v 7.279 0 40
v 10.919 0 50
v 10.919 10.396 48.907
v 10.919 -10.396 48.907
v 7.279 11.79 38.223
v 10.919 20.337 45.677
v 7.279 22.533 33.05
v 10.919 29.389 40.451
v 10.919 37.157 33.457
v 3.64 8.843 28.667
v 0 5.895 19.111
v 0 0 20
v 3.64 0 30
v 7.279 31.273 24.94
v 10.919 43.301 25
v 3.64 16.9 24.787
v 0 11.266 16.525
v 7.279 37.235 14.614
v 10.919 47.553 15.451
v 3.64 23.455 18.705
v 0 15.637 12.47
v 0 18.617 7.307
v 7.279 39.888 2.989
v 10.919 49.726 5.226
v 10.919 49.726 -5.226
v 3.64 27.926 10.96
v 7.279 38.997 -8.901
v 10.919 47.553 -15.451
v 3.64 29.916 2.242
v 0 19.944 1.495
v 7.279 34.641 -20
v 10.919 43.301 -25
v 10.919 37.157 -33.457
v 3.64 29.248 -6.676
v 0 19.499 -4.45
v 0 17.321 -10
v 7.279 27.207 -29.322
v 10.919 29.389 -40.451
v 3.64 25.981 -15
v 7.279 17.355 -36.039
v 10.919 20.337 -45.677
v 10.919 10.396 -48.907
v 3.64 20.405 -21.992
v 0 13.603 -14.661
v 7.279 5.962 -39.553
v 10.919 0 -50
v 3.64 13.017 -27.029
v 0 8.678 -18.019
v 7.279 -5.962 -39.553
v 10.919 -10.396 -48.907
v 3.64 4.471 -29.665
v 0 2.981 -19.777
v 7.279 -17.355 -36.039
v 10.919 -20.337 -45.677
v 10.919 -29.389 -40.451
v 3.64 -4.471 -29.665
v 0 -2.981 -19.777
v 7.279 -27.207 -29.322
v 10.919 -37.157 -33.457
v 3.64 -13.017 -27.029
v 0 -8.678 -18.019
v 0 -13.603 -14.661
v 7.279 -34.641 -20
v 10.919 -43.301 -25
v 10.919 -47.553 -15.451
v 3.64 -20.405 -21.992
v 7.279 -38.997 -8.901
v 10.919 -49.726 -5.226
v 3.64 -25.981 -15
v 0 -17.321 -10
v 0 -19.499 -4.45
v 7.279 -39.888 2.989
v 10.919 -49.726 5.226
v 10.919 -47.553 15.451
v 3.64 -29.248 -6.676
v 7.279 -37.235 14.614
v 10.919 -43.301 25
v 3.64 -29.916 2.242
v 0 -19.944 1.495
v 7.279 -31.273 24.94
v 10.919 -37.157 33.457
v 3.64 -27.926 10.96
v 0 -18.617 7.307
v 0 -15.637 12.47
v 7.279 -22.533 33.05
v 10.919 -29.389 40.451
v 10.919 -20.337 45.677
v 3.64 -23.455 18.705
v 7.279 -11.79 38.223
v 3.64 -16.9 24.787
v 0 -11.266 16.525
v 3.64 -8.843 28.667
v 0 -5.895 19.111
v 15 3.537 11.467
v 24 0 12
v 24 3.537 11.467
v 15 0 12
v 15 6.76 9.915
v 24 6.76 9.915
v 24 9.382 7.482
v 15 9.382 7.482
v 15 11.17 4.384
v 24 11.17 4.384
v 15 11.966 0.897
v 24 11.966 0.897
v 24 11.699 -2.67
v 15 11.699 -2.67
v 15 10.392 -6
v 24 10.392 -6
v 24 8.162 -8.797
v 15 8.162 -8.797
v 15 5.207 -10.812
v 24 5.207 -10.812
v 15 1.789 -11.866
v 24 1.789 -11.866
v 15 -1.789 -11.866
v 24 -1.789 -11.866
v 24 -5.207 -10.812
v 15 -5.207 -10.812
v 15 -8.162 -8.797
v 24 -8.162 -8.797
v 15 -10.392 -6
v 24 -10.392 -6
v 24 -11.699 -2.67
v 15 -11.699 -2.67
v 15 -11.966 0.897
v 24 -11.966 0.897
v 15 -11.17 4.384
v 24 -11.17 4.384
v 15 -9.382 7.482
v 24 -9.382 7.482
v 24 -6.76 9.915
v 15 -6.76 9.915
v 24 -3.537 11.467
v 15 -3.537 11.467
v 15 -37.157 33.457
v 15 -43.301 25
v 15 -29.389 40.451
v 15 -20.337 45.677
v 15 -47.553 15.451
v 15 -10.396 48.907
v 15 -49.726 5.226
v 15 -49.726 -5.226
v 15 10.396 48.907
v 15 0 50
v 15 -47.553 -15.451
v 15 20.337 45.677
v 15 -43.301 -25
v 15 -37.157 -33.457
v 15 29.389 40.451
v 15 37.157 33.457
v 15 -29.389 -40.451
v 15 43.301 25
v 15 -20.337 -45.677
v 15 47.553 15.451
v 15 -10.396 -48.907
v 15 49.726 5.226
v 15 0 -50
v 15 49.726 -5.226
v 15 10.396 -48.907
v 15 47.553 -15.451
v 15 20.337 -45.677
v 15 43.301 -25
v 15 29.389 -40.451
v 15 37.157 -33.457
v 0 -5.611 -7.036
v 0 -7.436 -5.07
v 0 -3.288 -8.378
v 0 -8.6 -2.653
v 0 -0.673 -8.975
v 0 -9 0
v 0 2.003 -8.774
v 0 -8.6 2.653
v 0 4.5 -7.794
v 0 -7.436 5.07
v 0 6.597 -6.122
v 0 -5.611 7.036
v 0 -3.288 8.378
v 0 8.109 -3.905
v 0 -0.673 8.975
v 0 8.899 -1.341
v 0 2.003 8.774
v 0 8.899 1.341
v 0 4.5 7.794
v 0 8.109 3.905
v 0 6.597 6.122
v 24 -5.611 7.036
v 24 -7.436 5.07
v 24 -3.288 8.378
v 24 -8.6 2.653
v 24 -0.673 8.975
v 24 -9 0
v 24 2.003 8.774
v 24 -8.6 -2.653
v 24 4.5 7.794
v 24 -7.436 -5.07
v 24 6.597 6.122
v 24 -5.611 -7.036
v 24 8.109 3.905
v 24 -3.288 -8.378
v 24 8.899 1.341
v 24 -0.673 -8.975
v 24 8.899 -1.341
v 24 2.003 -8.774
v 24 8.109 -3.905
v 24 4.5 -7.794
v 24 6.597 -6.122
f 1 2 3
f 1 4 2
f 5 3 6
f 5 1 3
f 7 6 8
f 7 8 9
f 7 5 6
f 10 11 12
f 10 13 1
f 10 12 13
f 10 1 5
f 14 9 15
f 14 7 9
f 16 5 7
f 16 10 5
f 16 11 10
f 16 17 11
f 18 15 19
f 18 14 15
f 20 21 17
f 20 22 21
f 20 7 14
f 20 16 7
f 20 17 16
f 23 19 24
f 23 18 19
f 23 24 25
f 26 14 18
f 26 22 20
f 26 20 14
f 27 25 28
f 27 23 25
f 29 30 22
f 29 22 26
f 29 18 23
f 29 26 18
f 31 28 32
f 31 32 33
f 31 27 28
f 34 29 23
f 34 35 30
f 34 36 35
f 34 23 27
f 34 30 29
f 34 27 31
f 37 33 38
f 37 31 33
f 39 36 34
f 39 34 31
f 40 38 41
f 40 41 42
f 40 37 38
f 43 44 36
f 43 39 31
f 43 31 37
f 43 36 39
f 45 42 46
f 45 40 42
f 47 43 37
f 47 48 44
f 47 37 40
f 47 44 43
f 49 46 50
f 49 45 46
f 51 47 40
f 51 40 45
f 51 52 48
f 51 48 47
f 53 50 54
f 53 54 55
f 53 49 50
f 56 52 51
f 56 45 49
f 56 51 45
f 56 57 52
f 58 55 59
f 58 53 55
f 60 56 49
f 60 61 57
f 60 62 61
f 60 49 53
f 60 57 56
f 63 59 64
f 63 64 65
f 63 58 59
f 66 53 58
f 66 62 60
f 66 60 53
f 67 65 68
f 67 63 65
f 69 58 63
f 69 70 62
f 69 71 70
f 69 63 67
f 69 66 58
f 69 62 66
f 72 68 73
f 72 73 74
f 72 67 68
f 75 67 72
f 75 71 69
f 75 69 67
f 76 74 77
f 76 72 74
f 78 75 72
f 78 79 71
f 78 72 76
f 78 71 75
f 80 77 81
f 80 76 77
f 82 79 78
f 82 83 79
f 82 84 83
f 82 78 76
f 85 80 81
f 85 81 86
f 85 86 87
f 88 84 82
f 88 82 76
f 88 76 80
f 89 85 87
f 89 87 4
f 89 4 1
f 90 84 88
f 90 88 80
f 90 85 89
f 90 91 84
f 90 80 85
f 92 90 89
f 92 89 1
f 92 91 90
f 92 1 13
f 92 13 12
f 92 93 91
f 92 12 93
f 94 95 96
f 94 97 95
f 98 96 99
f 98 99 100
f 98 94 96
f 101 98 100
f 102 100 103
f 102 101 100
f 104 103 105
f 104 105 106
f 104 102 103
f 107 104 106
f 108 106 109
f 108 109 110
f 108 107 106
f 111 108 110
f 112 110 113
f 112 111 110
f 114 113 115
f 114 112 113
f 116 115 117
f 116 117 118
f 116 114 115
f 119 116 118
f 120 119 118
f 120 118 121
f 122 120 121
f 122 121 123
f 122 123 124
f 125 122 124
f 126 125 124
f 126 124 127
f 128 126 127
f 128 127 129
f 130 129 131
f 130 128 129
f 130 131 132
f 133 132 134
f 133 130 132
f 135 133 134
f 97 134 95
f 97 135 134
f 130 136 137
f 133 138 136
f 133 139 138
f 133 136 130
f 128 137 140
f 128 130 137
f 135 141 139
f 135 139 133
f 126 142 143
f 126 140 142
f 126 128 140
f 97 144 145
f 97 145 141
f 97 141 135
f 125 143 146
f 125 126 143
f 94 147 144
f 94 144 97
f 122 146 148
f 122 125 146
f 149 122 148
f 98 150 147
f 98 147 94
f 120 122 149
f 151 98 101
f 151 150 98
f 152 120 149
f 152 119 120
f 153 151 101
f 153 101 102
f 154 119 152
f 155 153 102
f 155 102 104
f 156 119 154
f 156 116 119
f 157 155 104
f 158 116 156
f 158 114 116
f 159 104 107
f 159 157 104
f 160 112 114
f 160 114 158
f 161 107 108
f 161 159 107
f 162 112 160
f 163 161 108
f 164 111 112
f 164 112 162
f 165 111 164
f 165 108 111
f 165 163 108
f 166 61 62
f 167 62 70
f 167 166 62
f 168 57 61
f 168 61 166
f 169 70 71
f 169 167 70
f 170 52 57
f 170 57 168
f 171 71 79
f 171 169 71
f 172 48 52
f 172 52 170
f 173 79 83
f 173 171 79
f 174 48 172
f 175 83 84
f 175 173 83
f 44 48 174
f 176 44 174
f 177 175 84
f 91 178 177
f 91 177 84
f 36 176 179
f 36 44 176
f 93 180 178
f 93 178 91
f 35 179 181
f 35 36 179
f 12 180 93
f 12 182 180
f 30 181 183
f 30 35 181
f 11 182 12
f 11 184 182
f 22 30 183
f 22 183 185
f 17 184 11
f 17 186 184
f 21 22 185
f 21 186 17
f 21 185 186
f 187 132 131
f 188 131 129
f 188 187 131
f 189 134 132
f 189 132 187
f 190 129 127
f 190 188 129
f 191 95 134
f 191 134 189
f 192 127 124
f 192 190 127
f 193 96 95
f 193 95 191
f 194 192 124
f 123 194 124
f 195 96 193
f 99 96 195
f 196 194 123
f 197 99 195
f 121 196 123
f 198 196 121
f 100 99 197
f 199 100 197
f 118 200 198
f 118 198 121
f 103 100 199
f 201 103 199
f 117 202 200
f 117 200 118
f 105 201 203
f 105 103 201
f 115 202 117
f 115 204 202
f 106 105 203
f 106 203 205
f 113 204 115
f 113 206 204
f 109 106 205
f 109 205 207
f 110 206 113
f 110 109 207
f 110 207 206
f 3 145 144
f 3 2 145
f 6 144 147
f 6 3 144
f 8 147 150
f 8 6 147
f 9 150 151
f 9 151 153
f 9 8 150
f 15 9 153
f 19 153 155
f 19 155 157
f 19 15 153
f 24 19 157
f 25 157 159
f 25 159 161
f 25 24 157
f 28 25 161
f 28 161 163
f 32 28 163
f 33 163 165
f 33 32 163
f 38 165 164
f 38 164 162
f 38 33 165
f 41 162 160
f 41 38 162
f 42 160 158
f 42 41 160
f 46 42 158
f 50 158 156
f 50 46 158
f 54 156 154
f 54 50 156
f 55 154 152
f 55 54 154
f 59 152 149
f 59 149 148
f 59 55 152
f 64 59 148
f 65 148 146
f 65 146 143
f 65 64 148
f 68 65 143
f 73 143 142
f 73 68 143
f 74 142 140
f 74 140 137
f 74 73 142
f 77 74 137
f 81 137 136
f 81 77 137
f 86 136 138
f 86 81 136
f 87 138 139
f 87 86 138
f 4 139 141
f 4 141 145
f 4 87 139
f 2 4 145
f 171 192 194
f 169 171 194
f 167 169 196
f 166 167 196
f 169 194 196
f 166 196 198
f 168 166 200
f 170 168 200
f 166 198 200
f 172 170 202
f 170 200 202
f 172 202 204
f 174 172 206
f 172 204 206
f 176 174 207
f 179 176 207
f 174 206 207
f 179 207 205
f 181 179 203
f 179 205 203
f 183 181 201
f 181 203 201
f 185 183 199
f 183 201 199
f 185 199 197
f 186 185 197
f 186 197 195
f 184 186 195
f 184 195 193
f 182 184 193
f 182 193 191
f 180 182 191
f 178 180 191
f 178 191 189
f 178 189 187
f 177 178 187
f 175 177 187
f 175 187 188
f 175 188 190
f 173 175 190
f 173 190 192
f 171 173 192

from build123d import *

# Parameters (mm, degrees)
F3_D = 18


with BuildPart() as f1:
    # F0 (on Front) → F1 (revolve)
    with BuildSketch(Plane.XZ):
        Polygon((10.919107, 50), (0, 20), (0, 0), (24, 0), (24, 12), (15, 12), (15, 50), align=None)
    revolve(axis=Axis((12, 0, 0), (-1, 0, 0)))

    # F3 (through all)
    with Locations(Plane(origin=(0, 0, 0), x_dir=(0, 1, 0), z_dir=(-1, 0, 0))):
        with Locations((0, 0)):
            Hole(F3_D / 2)


solid = f1.part
